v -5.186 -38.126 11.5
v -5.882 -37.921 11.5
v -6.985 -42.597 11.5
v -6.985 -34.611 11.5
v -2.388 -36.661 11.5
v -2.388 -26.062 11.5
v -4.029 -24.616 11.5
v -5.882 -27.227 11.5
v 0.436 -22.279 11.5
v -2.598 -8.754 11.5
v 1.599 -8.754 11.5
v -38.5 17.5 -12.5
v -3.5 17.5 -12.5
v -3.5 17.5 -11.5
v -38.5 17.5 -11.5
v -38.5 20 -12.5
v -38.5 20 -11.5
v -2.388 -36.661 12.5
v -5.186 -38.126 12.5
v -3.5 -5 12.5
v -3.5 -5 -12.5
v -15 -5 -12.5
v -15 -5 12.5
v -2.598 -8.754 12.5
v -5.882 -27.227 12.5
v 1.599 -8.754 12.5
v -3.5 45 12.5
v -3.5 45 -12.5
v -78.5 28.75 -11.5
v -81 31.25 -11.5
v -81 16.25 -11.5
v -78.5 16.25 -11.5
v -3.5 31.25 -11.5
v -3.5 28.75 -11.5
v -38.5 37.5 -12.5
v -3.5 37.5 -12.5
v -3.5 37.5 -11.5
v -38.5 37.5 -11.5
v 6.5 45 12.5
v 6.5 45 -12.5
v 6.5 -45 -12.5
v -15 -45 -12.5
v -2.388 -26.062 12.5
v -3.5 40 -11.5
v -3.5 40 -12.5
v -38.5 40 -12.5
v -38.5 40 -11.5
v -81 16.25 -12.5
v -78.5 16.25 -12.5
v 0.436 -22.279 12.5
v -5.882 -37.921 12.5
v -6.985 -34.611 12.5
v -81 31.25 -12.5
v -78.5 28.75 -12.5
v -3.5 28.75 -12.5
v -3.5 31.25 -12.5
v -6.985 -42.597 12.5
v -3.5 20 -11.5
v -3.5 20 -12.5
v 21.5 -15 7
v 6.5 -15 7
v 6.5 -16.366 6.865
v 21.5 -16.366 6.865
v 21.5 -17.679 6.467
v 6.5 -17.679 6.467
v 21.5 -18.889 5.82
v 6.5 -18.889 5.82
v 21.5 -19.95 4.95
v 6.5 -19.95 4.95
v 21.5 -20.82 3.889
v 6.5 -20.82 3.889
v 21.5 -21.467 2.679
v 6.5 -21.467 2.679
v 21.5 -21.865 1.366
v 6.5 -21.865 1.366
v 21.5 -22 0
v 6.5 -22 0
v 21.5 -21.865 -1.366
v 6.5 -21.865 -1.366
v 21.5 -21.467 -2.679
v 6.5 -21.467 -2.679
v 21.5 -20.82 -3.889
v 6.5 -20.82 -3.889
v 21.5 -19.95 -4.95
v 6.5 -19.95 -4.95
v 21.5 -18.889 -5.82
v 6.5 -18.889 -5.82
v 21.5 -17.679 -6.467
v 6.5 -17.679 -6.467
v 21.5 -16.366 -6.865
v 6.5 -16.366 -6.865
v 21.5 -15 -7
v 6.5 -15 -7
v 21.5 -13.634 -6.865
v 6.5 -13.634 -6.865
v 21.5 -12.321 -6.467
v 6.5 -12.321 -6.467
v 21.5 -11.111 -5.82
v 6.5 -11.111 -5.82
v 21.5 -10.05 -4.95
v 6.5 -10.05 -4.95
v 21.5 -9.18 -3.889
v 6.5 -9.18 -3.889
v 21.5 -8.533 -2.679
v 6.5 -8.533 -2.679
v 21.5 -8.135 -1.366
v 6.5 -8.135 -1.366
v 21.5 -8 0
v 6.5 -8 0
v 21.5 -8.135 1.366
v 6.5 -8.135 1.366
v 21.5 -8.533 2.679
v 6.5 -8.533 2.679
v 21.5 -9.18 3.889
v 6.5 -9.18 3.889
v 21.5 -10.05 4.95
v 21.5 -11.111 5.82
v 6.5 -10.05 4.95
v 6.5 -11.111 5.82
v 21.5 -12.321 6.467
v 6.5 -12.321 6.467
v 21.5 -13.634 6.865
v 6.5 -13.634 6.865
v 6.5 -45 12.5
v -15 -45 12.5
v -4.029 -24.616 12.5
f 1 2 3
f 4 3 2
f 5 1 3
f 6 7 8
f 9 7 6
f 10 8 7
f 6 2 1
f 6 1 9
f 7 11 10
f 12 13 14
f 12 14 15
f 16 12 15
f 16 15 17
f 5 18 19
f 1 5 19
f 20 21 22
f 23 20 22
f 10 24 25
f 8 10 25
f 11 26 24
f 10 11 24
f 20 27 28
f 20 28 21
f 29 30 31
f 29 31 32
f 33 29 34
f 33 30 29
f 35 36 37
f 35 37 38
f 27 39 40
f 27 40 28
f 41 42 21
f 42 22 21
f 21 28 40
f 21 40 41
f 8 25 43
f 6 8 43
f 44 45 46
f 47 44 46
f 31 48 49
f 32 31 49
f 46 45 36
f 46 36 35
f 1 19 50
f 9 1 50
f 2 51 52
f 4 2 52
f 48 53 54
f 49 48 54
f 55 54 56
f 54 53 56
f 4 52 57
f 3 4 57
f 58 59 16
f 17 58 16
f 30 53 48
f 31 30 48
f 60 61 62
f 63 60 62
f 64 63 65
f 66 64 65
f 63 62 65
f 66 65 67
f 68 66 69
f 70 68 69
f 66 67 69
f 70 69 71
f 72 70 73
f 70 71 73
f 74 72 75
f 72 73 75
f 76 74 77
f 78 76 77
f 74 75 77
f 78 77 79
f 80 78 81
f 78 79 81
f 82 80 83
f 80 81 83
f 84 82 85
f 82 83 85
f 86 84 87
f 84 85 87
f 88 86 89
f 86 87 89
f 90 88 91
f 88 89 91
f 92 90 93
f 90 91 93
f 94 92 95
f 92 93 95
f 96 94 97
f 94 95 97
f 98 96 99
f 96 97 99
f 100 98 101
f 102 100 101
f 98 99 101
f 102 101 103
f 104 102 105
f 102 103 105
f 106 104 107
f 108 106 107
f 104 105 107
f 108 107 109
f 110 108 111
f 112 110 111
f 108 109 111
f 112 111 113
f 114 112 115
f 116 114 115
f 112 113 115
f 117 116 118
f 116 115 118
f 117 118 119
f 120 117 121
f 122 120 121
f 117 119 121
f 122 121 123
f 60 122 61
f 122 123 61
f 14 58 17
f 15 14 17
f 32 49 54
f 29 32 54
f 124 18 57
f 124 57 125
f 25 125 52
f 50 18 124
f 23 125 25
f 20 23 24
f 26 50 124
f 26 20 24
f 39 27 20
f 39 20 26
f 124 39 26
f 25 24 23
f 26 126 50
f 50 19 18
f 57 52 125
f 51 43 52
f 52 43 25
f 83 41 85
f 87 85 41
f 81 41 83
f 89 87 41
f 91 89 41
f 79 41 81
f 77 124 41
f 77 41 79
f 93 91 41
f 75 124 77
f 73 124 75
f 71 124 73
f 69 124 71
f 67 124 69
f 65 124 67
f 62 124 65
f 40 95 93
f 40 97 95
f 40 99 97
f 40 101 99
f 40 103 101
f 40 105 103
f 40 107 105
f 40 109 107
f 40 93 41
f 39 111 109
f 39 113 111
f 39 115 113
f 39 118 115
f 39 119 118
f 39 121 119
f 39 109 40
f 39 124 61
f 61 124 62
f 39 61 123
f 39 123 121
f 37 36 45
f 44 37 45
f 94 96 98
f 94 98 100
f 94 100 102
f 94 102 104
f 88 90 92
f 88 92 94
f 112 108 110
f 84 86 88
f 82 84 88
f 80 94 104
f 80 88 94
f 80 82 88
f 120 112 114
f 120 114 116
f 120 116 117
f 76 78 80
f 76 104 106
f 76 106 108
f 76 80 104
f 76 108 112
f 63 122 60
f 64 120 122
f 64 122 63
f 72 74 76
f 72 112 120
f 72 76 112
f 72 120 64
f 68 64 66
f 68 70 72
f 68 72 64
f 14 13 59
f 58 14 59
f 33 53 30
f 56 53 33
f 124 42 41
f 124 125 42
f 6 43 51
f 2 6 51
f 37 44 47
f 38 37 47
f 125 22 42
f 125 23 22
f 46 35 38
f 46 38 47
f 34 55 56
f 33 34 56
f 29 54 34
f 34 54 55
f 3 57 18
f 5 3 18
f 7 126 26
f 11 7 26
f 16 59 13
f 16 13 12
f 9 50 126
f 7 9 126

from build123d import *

# Parameters (mm, degrees)
BOSS_EXTRUDE1_DEPTH   = 12.5
CUT_EXTRUDE1_DEPTH    = 1
SKETCH4_W             = 35
SKETCH4_H             = 2.5
BOSS_EXTRUDE2_DEPTH   = 1
BOSS_EXTRUDE2_2_DEPTH = 1
BOSS_EXTRUDE2_3_DEPTH = 1
SKETCH6_R             = 7
BOSS_EXTRUDE3_DEPTH   = 15


with BuildPart() as part:
    # Sketch1 → Boss-Extrude1 (new, symmetric)
    with BuildSketch(Plane.XY):
        Polygon((-15, -45), (6.5, -45), (6.5, 45), (-3.5, 45), (-3.5, -5), (-15, -5), align=None)
    extrude(amount=BOSS_EXTRUDE1_DEPTH, both=True)

    # Sketch2 → Cut-Extrude1 (cut)
    with BuildSketch(Plane.XY.offset(12.5)):
        Polygon((-2.597622066, -8.753911623), (-5.881737798, -27.227062612), (-2.387698703, -26.062382913), (-5.881737798, -37.920939842), (-6.984975478, -34.6112268), (-6.984975478, -42.59710263), (-2.387698703, -36.660968168), (-5.186296848, -38.12584655), (0.436139273, -22.279056437), (-4.028838278, -24.616172646), (1.599086918, -8.753911623), align=None)
    extrude(amount=-CUT_EXTRUDE1_DEPTH, mode=Mode.SUBTRACT)

    # Sketch6 → Boss-Extrude3 (add)
    with BuildSketch(Plane(origin=(6.5, 0, 0), x_dir=(0, 0, -1), z_dir=(1, 0, 0))):
        with Locations(Location((0, -15, 0), (0, 0, 180))):
            Circle(SKETCH6_R)
    extrude(amount=BOSS_EXTRUDE3_DEPTH)


with BuildPart() as body_2:
    # Sketch4 → Boss-Extrude2 (new body)
    with BuildSketch(Plane(origin=(0, 0, -12.5), x_dir=(-1, 0, 0), z_dir=(0, 0, -1))):
        with Locations((21, 38.75)):
            Rectangle(SKETCH4_W, SKETCH4_H)
    extrude(amount=-BOSS_EXTRUDE2_DEPTH)


with BuildPart() as body_3:
    # Sketch4 → Boss-Extrude2 2 (new body)
    with BuildSketch(Plane(origin=(0, 0, -12.5), x_dir=(-1, 0, 0), z_dir=(0, 0, -1))):
        with Locations((21, 18.75)):
            Rectangle(SKETCH4_W, SKETCH4_H)
    extrude(amount=-BOSS_EXTRUDE2_2_DEPTH)


with BuildPart() as body_4:
    # Sketch4 → Boss-Extrude2 3 (new body)
    with BuildSketch(Plane(origin=(0, 0, -12.5), x_dir=(-1, 0, 0), z_dir=(0, 0, -1))):
        Polygon((3.5, 31.25), (78.5, 31.25), (81, 31.25), (81, 16.25), (78.5, 16.25), (78.5, 28.75), (3.5, 28.75), align=None)
    extrude(amount=-BOSS_EXTRUDE2_3_DEPTH)


solid = Compound([part.part, body_2.part, body_3.part, body_4.part])
